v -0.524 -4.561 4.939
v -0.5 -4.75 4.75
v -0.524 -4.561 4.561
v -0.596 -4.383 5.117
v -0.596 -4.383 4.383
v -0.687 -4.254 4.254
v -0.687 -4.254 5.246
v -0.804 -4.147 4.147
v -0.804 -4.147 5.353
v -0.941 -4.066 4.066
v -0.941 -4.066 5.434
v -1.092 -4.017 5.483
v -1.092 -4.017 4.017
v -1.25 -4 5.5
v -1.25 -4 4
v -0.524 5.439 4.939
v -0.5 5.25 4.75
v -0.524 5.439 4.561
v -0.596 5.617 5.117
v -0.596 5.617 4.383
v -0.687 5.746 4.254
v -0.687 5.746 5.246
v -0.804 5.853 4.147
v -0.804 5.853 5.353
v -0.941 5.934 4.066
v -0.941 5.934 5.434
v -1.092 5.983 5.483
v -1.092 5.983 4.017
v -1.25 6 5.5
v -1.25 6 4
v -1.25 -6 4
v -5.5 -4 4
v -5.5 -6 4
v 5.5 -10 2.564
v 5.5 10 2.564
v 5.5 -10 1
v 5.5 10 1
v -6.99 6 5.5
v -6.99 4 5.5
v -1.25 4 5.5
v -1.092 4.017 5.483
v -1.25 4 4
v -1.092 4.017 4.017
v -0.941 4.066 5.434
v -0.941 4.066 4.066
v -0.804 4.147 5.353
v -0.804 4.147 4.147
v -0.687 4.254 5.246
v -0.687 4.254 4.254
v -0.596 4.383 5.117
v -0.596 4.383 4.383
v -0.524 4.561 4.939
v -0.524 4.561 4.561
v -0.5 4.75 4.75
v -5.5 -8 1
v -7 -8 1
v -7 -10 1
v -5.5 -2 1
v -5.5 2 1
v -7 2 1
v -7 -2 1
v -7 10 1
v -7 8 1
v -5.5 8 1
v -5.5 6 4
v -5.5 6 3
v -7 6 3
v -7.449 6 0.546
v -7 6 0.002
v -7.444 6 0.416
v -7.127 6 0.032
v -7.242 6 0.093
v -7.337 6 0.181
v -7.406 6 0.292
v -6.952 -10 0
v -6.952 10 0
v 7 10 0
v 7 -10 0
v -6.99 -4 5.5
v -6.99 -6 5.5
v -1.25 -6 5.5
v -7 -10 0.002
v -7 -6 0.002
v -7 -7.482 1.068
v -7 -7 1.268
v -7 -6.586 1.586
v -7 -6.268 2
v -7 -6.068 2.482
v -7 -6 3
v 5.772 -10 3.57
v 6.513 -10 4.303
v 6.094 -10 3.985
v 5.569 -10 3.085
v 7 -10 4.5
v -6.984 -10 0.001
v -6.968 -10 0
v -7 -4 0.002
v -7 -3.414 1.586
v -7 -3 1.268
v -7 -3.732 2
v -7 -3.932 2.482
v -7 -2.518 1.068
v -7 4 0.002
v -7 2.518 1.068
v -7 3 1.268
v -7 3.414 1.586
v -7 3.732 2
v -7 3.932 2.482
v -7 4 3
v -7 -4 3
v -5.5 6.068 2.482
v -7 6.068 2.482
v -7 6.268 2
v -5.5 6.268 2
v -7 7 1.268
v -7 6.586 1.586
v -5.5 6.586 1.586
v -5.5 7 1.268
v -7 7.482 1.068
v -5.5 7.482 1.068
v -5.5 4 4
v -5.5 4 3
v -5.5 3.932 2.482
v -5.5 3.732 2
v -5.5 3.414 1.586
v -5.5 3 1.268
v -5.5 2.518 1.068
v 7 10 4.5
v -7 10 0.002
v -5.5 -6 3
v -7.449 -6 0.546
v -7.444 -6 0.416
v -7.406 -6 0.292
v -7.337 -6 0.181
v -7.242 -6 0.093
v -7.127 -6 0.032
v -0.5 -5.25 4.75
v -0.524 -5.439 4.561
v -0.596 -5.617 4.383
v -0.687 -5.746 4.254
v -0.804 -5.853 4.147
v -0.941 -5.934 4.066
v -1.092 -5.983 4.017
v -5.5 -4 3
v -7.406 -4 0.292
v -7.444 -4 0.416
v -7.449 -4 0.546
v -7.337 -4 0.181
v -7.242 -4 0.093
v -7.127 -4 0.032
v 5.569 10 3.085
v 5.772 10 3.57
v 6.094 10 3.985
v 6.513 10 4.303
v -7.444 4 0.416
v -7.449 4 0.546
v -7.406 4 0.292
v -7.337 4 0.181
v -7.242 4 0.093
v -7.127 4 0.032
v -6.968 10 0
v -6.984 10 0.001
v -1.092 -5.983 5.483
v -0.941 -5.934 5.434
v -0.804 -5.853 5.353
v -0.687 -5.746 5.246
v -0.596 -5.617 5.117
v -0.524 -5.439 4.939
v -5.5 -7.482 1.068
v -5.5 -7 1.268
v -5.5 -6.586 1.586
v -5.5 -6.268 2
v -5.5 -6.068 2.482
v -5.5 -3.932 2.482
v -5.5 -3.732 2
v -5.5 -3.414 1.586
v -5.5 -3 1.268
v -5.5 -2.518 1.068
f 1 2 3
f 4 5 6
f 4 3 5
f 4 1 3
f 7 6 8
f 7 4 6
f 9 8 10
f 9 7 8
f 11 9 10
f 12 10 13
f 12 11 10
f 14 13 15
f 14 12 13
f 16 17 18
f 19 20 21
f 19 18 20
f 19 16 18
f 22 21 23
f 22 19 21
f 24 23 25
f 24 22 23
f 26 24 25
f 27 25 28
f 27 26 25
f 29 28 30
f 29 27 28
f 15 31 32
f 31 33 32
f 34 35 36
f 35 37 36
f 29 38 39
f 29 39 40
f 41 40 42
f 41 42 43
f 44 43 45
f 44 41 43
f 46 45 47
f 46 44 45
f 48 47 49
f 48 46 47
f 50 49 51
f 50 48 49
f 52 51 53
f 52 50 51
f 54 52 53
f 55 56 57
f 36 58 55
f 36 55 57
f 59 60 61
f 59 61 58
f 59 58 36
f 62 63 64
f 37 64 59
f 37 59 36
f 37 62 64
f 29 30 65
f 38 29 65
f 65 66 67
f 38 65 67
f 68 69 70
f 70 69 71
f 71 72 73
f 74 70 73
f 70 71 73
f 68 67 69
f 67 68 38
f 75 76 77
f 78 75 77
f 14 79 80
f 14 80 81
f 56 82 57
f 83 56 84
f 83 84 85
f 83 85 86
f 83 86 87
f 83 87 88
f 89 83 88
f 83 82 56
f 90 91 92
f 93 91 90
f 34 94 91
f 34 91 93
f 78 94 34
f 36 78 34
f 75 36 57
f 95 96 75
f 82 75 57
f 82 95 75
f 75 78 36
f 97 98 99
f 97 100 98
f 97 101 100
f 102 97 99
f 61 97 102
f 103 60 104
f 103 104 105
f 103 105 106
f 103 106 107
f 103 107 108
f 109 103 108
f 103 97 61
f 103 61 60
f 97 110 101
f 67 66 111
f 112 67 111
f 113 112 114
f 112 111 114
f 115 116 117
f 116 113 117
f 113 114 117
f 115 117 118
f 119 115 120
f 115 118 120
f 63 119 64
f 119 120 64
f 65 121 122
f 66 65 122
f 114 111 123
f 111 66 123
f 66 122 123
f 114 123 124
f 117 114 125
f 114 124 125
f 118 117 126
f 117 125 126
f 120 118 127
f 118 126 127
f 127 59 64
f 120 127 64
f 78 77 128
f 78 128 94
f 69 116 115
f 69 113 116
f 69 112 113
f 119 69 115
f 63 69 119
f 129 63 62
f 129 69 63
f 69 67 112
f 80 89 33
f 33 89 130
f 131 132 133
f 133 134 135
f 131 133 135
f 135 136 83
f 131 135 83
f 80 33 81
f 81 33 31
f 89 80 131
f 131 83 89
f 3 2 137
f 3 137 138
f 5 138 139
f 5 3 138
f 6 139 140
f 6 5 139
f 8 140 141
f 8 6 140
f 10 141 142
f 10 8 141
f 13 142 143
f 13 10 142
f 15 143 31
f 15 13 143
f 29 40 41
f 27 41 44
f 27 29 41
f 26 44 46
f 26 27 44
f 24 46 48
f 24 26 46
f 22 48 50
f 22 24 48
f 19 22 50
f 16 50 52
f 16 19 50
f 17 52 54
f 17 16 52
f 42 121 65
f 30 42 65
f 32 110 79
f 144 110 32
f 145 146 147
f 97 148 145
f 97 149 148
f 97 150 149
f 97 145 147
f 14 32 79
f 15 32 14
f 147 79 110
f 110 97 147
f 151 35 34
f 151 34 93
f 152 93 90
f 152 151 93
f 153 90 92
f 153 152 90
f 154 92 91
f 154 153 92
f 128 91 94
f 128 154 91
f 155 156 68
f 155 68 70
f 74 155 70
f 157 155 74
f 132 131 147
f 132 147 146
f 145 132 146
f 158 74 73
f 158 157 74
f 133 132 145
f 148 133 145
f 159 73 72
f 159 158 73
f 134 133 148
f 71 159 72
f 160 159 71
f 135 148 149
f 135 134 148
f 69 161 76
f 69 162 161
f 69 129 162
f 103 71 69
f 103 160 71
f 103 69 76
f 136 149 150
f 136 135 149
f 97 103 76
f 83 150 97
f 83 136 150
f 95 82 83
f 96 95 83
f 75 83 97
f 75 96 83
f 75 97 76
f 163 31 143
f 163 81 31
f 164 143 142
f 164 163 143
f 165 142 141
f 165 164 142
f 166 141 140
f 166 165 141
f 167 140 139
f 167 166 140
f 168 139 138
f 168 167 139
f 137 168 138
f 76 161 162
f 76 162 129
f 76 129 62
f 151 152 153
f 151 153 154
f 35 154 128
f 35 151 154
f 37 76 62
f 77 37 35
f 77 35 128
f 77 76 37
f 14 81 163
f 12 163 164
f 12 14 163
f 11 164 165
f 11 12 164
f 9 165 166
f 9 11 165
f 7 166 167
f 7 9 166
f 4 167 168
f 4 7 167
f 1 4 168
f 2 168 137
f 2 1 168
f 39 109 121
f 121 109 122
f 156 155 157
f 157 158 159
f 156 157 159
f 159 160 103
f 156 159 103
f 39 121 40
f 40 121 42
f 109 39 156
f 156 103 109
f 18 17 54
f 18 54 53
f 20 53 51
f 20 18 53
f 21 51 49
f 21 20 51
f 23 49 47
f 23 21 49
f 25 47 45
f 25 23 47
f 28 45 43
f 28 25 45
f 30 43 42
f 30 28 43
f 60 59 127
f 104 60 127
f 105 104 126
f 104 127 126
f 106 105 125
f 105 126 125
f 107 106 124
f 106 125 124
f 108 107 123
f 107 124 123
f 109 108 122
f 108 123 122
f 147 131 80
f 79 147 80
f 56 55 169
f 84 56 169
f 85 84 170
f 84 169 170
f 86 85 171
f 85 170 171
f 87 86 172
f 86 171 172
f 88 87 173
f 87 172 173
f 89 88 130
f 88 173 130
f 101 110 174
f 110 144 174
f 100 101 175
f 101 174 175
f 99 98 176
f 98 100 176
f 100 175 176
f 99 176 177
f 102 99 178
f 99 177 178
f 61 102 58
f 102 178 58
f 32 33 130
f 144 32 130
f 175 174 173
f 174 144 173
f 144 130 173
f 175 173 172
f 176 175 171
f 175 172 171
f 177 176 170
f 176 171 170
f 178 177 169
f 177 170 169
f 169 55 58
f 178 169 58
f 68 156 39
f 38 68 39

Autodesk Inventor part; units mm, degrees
ref_plane "YZ Plane" through (0, 0, 0) normal (1, 0, 0) x (0, 1, 0)
ref_plane "XZ Plane" through (0, 0, 0) normal (0, 1, 0) x (-1, 0, 0)
ref_plane "XY Plane" through (0, 0, 0) normal (0, 0, 1) x (1, 0, 0)
sketch "Schizzo1" plane through (0, 0, 0) normal (0, 0, 1) x (1, 0, 0)
  line L0 (-7, 10) -> (7, 10)
  line L1 (7, 10) -> (7, -10)
  line L2 (7, -10) -> (-7, -10)
  line L3 (-7, -10) -> (-7, 10)
  line L4 (-7, 10) -> (7, -10) construction
  line L5 (7, 10) -> (-7, -10) construction
  line L6 (-5.5, 10) -> (-5.5, -10)
  line L7 (5.5, 10) -> (5.5, -10)
  line L8 (-7, 6) -> (-5.5, 6)
  line L9 (-7, 4) -> (-5.5, 4)
  line L10 (-7, -4) -> (-5.5, -4)
  line L11 (-7, -6) -> (-5.5, -6)
  line L12 (-7, 6) -> (-7.5, 6)
  line L13 (-7.5, 6) -> (-7.5, 4)
  line L14 (-7.5, 4) -> (-7, 4)
  line L15 (-7, 4) -> (-7, 6)
  line L16 (-7, -4) -> (-7.5, -4)
  line L17 (-7.5, -4) -> (-7.5, -6)
  line L18 (-7.5, -6) -> (-7, -6)
  line L19 (-7, -6) -> (-7, -4)
  point P0 (0, 0)
  point P1 (0, 0)
  point P2 (-6.25, 4)
  point P3 (-6.25, -6)
  point P4 (-7, 5)
  dimension "d0" = 14
  dimension "d1" = 20
  dimension "d2" = 1.5
  dimension "d3" = 1.5
  dimension "d4" = 4
  dimension "d5" = 2
  dimension "d6" = 2
  dimension "d7" = 4
  dimension "d19" = 0.5
extrude "Estrusione1" add sketch "Schizzo1" along normal blind 1 contours L0 L6 L8 L3 | L0 L7 L2 L6 | L8 L6 L9 L3 | L0 L1 L2 L7 | L9 L6 L10 L3 | L10 L6 L11 L3 | L2 L3 L11 L6
extrude "Estrusione2" add sketch "Schizzo1" along normal blind 4.5 contours L0 L1 L2 L7
extrude "Estrusione3" add sketch "Schizzo1" along normal blind 5.5 contours L8 L6 L9 L3 | L10 L6 L11 L3
sketch "Schizzo2" plane through (-5.5, 4, 1) normal (1, 0, 0) x (0, 0, -1)
  line L0 (0, -10) -> (-4.5, -10) projected
  line L1 (-3, -10) -> (-3, -8)
  line L2 (0, -8) -> (-4.5, -8) projected
  line L3 (0, 0) -> (-4.5, 0) projected
  line L4 (-3, 0) -> (-3, 2)
  line L5 (0, 2) -> (-4.5, 2) projected
  line L6 (-4.5, -10) -> (-4.5, -8) projected
  line L7 (-3, 0) -> (-4.5, 0)
  line L8 (-4.5, 0) -> (-4.5, 2) projected
  line L9 (-4.5, 2) -> (-3, 2)
  point P0 (1, -4)
  dimension "d14" = 1.5
extrude "Estrusione4" add sketch "Schizzo2" along normal blind 5
fillet "Raccordo1" radius 2 5 edges at (-6.25, -6, 1) (-6.25, -4, 1) (-6.25, 4, 1) (-6.25, 6, 1) (5.5, 0, 4.5)
fillet "Raccordo2" radius 0.75 8 edges at (-0.5, 5, 5.5) (-0.5, 5, 4) (-0.5, -5, 5.5) (-0.5, -5, 4) (-0.5, -6, 4.75) (-0.5, -4, 4.75) (-0.5, 4, 4.75) (-0.5, 6, 4.75)
extrude "Estrusione5" add sketch "Schizzo1" along normal blind 5.5 contours L3 L14 L13 L12 | L3 L18 L17 L16
sketch "Schizzo3" plane through (-7, -6, 3) normal (0, -1, 0) x (1, 0, 0)
  line L0 (-0.5, 2.5) -> (5.75, 2.5) projected
  line L1 (0.0105, 2.5) -> (-0.5, 2.5)
  line L2 (-0.5, 2.5) -> (-0.5, -3)
  line L3 (-0.5, -3) -> (0.0105, 2.5)
  point P0 (7, -3)
  point P1 (0.0105, 2.5)
extrude "Estrusione6" cut sketch "Schizzo3" against normal blind 90
fillet "Raccordo3" radius 0.5 1 edges at (-7.5, 5, 0)
equation "\"d0\" = Larghezza"
equation "\"d1\" = Lunghezza"
equation "\"d2\" = Parete"
equation "\"d3\" = d2"
equation "\"d4\" = Gancio_bordo"
equation "\"d5\" = Gancio_larghezza_base"
equation "\"d6\" = d5"
equation "\"d7\" = d4"
equation "\"Lunghezza\" = 20"
equation "\"Larghezza\" = 14"
equation "\"Parete\" = 1.5"
equation "\"Gancio_gancio\" = 8"
equation "\"Gancio_bordo\" = 4"
equation "\"Gancio_larghezza_base\" = 2"
equation "\"Gancio_spessore\" = 1"
equation "\"Gancio_altezza\" = 5.5"
equation "\"Altezza_parete\" = 4.5"
equation "\"Spessore_base\" = 1"
equation "\"Gancio_larghezza\" = 1.5"
equation "\"Gancio_estrusione\" = 5"
properties part number "Supporto anello"
